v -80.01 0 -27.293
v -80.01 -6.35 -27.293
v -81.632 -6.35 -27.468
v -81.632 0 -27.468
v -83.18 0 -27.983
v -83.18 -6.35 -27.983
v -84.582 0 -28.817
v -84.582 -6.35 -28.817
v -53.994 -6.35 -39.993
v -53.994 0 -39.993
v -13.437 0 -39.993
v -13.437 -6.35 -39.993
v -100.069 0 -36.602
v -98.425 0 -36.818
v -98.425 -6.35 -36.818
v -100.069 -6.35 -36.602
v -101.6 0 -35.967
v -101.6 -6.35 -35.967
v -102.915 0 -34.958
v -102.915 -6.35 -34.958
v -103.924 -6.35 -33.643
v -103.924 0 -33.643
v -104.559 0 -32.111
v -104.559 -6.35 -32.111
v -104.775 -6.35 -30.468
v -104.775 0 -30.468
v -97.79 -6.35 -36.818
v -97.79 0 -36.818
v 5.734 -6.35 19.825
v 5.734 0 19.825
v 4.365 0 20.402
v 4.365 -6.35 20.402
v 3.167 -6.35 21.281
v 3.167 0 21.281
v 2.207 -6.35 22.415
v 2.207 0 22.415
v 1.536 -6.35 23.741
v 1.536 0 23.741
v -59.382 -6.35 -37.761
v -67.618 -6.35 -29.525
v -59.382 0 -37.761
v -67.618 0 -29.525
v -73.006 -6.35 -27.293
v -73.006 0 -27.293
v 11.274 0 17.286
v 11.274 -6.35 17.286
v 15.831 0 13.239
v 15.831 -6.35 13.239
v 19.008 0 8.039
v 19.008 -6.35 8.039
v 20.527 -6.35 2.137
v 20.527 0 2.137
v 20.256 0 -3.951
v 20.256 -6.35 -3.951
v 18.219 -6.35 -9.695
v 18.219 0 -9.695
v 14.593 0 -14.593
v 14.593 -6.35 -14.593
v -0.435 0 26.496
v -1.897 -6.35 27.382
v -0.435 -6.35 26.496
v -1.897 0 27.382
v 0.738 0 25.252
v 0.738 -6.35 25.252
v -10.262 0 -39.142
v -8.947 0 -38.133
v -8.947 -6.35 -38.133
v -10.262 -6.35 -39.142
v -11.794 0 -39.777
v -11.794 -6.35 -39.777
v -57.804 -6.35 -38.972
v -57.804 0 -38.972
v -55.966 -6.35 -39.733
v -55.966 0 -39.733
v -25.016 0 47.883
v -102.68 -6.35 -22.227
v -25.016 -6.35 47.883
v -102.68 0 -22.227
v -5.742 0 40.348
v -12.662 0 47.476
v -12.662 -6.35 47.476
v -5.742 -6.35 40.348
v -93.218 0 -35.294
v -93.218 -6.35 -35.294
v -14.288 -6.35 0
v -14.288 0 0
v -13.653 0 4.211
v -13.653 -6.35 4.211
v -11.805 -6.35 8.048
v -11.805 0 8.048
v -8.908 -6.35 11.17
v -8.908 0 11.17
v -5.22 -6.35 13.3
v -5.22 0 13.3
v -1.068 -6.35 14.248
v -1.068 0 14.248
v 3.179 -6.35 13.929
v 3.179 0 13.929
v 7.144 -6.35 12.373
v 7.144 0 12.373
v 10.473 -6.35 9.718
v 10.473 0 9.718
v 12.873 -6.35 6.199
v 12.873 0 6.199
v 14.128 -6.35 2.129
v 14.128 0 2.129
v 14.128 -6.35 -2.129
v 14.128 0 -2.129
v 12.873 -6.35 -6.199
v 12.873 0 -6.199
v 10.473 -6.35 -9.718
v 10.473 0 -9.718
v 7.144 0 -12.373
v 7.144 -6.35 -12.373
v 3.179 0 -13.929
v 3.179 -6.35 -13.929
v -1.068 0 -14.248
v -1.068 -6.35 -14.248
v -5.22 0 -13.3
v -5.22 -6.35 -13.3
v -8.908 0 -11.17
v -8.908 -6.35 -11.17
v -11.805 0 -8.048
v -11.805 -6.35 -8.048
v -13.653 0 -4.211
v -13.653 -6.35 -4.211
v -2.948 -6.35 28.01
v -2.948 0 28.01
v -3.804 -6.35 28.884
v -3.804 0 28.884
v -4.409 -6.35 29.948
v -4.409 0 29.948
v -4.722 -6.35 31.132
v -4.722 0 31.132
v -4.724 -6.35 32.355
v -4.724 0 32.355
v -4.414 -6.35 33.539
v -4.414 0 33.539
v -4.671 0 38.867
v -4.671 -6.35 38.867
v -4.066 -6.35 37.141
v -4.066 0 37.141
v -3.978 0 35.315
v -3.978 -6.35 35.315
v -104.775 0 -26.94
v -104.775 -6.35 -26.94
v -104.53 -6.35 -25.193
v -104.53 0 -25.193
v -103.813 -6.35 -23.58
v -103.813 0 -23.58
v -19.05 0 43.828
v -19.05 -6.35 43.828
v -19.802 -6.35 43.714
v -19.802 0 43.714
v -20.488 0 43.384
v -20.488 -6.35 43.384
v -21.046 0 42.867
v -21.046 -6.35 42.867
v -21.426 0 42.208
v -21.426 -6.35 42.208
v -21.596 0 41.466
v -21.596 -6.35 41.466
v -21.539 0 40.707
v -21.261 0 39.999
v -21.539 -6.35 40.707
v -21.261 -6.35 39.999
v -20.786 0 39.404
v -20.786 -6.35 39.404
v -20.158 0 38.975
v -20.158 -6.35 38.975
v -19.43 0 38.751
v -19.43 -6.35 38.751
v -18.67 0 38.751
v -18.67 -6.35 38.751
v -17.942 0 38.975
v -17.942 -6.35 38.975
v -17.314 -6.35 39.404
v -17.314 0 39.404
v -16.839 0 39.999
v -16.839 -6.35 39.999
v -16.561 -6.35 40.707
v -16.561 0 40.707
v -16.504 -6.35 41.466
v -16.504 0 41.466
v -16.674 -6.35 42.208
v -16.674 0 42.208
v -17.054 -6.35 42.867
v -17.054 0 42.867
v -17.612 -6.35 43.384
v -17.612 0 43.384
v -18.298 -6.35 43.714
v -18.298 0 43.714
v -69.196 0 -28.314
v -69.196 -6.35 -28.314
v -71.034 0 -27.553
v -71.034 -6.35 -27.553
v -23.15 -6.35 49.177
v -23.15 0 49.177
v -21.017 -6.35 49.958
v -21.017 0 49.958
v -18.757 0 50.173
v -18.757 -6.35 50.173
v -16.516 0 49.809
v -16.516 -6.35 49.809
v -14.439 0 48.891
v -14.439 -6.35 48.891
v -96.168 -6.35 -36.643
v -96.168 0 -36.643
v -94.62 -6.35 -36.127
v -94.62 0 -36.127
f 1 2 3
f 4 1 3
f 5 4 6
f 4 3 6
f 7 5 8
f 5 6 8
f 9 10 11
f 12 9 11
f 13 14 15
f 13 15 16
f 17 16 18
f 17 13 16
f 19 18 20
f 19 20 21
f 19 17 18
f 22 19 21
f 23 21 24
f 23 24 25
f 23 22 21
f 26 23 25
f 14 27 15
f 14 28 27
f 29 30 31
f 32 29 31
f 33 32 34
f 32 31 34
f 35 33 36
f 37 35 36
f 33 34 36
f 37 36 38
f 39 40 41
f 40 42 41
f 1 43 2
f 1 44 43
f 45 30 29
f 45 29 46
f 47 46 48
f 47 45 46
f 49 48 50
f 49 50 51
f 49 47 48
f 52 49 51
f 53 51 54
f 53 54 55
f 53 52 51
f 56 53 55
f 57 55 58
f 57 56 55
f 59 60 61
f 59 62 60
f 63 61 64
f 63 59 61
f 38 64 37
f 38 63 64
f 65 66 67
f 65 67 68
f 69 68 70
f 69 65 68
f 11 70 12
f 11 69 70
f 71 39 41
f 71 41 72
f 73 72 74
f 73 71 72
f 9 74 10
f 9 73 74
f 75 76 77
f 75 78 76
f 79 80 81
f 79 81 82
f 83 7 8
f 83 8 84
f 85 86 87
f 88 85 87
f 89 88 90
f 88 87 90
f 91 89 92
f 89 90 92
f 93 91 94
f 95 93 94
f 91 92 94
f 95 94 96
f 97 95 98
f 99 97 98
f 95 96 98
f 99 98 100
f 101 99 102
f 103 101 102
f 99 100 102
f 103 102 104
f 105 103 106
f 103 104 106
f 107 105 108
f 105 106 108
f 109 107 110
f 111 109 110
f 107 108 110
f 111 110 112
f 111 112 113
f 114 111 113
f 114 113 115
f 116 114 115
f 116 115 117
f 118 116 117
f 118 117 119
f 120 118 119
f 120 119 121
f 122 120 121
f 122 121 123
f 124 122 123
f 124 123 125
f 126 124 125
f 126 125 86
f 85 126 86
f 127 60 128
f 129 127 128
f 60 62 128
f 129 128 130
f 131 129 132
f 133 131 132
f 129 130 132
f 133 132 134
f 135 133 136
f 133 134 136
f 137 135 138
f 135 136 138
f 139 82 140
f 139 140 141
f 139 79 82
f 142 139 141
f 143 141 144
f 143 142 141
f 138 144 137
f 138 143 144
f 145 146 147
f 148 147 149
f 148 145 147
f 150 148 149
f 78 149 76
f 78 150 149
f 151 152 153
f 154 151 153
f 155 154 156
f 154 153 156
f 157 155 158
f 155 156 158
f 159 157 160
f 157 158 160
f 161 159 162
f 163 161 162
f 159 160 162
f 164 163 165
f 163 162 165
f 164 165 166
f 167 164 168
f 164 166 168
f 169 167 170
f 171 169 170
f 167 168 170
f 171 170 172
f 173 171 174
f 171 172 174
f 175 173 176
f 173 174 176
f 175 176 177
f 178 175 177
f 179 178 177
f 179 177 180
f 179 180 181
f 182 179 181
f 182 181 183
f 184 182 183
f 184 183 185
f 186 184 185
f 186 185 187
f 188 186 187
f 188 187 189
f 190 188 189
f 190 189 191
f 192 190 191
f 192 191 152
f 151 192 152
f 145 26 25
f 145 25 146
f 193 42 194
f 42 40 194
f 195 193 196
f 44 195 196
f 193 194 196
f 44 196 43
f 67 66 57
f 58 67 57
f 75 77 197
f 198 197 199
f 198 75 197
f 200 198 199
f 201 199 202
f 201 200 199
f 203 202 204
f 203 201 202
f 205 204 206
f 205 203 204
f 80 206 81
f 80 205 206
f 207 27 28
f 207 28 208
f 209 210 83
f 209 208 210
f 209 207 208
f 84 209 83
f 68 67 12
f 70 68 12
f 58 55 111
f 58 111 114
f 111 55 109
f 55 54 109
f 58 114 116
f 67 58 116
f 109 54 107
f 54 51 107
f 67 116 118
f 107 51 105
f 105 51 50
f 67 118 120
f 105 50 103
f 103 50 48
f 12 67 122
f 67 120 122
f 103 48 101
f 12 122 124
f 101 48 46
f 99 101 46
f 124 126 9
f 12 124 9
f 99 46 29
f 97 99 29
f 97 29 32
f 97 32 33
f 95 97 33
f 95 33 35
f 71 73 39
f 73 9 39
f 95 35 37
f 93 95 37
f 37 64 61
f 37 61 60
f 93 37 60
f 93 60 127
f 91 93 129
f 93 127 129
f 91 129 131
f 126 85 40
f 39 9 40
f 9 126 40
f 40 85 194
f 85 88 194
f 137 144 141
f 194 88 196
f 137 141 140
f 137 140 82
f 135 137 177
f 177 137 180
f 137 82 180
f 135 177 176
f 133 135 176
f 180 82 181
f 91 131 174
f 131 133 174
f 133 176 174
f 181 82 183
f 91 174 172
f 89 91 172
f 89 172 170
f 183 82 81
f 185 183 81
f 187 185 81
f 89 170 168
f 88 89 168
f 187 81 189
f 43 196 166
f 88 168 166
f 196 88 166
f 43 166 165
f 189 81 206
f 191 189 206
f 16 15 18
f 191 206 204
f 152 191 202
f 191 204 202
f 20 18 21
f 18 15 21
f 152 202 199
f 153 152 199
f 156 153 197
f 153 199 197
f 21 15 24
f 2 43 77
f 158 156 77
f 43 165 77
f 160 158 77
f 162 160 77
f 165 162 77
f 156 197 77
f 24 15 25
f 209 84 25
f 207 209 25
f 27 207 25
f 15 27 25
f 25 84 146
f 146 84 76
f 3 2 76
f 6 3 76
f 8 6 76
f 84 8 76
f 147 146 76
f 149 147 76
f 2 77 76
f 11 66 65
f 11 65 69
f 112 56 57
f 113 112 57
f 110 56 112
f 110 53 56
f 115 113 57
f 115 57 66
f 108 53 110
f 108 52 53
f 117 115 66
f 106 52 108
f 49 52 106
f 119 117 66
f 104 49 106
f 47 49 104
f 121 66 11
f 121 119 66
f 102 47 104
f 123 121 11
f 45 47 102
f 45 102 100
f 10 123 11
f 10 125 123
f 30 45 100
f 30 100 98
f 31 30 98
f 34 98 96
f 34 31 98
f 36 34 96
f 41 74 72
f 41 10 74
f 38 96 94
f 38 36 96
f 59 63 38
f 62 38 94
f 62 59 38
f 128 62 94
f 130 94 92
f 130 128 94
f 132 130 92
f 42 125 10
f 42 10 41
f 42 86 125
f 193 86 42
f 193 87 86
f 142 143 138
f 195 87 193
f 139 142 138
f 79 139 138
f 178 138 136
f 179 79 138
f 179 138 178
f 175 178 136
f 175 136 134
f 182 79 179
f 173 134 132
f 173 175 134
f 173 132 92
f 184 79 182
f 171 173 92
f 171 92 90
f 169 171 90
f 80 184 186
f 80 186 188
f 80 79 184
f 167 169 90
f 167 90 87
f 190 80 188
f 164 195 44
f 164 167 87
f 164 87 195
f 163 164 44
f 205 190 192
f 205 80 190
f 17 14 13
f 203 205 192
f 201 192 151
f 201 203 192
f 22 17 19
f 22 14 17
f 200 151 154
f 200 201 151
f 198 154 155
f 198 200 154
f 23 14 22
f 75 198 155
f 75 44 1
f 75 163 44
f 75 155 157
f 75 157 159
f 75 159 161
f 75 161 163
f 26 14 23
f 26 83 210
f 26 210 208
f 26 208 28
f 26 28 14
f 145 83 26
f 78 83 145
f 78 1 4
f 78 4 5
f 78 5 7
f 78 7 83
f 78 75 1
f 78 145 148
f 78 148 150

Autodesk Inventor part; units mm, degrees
ref_plane "YZ Plane" through (0, 0, 0) normal (1, 0, 0) x (0, 1, 0)
ref_plane "XZ Plane" through (0, 0, 0) normal (0, 1, 0) x (-1, 0, 0)
ref_plane "XY Plane" through (0, 0, 0) normal (0, 0, 1) x (1, 0, 0)
sketch "Sketch1" plane through (0, 0, 0) normal (0, 1, 0) x (-1, 0, 0)
  circle A0 centre (76.2, -63.1164) radius 16.7005 construction
  line L0 (69.85, -27.2929) -> (82.55, -27.2929)
  line L1 (82.55, -27.2929) -> (95.25, -36.8179)
  line L2 (95.25, -36.8179) -> (104.775, -36.8179)
  line L3 (104.775, -36.8179) -> (104.775, -24.1179)
  line L4 (104.775, -24.1179) -> (25.0156, 47.8833)
  line L5 (69.85, -27.2929) -> (57.15, -39.9929)
  line L6 (57.15, -39.9929) -> (10.8071, -39.9929)
  circle A1 centre (0, 0) radius 14.2875
  circle A2 centre (0, 0) radius 20.6375 construction
  line L7 (10.8071, -39.9929) -> (-14.5929, -14.5929)
  circle A3 centre (0, 31.75) radius 4.7625 construction
  circle A4 centre (19.05, 41.275) radius 2.5527 construction
  circle A5 centre (19.05, 41.275) radius 8.9027 construction
  line L8 (12.6625, 47.4764) -> (1.7098, 36.195)
  arc A6 (-1.27, 27.16) -> (1.7098, 36.195) centre (0, 31.75) ccw
  arc A7 (1.27, 20.5984) -> (-14.5929, -14.5929) centre (0, 0) ccw
  arc A8 (25.0156, 47.8833) -> (12.6625, 47.4764) centre (19.05, 41.275) ccw
  line L9 (-1.27, 27.16) -> (1.27, 20.5984)
  point P0 (76.2, -27.2929)
  dimension "d0" = 33.401
  dimension "d1" = 28.575
  dimension "d2" = 6.35
  dimension "d3" = 9.525
  dimension "d4" = 31.75
  dimension "d5" = 5.1054
  dimension "d6" = 6.35
  dimension "d7" = 19.05
  dimension "d8" = 9.525
  dimension "d9" = 25.4
  dimension "d10" = 25.4
  dimension "d11" = 12.7
  dimension "d12" = 12.7
  dimension "d13" = 12.7
  dimension "d15" = 76.2
  dimension "d16" = 76.2
  dimension "d17" = 12.7
  dimension "d18" = 3.175
  dimension "d19" = 9.525
  dimension "d20" = 12.7
  dimension "d34" = 4.445
  dimension "d35" = 1.27
  dimension "d36" = 1.27
extrude "Extrusion1" add sketch "Sketch1" against normal blind 6.35
fillet "Fillet1" radius 6.35 6 edges at (-1.7098, -3.175, 36.195) (-10.8071, -3.175, -39.9929) (-104.775, -3.175, -24.1179) (-104.775, -3.175, -36.8179) (1.27, -3.175, 27.16) (-1.27, -3.175, 20.5984)
fillet "Fillet2" radius 7.62 4 edges at (-69.85, -3.175, -27.2929) (-82.55, -3.175, -27.2929) (-57.15, -3.175, -39.9929) (-95.25, -3.175, -36.8179)
hole "Hole1" at (-19.05, 0, 41.275) direction (0, -1, 0) diameter 5.1054 end through all clearance for "Flat Head Machine Screw (82)" size "#10" standard "Ansi Unified Screw Threads"
equation "\"d17\" = d12"
properties part number "CL5-003" material "Aluminum 6061"
